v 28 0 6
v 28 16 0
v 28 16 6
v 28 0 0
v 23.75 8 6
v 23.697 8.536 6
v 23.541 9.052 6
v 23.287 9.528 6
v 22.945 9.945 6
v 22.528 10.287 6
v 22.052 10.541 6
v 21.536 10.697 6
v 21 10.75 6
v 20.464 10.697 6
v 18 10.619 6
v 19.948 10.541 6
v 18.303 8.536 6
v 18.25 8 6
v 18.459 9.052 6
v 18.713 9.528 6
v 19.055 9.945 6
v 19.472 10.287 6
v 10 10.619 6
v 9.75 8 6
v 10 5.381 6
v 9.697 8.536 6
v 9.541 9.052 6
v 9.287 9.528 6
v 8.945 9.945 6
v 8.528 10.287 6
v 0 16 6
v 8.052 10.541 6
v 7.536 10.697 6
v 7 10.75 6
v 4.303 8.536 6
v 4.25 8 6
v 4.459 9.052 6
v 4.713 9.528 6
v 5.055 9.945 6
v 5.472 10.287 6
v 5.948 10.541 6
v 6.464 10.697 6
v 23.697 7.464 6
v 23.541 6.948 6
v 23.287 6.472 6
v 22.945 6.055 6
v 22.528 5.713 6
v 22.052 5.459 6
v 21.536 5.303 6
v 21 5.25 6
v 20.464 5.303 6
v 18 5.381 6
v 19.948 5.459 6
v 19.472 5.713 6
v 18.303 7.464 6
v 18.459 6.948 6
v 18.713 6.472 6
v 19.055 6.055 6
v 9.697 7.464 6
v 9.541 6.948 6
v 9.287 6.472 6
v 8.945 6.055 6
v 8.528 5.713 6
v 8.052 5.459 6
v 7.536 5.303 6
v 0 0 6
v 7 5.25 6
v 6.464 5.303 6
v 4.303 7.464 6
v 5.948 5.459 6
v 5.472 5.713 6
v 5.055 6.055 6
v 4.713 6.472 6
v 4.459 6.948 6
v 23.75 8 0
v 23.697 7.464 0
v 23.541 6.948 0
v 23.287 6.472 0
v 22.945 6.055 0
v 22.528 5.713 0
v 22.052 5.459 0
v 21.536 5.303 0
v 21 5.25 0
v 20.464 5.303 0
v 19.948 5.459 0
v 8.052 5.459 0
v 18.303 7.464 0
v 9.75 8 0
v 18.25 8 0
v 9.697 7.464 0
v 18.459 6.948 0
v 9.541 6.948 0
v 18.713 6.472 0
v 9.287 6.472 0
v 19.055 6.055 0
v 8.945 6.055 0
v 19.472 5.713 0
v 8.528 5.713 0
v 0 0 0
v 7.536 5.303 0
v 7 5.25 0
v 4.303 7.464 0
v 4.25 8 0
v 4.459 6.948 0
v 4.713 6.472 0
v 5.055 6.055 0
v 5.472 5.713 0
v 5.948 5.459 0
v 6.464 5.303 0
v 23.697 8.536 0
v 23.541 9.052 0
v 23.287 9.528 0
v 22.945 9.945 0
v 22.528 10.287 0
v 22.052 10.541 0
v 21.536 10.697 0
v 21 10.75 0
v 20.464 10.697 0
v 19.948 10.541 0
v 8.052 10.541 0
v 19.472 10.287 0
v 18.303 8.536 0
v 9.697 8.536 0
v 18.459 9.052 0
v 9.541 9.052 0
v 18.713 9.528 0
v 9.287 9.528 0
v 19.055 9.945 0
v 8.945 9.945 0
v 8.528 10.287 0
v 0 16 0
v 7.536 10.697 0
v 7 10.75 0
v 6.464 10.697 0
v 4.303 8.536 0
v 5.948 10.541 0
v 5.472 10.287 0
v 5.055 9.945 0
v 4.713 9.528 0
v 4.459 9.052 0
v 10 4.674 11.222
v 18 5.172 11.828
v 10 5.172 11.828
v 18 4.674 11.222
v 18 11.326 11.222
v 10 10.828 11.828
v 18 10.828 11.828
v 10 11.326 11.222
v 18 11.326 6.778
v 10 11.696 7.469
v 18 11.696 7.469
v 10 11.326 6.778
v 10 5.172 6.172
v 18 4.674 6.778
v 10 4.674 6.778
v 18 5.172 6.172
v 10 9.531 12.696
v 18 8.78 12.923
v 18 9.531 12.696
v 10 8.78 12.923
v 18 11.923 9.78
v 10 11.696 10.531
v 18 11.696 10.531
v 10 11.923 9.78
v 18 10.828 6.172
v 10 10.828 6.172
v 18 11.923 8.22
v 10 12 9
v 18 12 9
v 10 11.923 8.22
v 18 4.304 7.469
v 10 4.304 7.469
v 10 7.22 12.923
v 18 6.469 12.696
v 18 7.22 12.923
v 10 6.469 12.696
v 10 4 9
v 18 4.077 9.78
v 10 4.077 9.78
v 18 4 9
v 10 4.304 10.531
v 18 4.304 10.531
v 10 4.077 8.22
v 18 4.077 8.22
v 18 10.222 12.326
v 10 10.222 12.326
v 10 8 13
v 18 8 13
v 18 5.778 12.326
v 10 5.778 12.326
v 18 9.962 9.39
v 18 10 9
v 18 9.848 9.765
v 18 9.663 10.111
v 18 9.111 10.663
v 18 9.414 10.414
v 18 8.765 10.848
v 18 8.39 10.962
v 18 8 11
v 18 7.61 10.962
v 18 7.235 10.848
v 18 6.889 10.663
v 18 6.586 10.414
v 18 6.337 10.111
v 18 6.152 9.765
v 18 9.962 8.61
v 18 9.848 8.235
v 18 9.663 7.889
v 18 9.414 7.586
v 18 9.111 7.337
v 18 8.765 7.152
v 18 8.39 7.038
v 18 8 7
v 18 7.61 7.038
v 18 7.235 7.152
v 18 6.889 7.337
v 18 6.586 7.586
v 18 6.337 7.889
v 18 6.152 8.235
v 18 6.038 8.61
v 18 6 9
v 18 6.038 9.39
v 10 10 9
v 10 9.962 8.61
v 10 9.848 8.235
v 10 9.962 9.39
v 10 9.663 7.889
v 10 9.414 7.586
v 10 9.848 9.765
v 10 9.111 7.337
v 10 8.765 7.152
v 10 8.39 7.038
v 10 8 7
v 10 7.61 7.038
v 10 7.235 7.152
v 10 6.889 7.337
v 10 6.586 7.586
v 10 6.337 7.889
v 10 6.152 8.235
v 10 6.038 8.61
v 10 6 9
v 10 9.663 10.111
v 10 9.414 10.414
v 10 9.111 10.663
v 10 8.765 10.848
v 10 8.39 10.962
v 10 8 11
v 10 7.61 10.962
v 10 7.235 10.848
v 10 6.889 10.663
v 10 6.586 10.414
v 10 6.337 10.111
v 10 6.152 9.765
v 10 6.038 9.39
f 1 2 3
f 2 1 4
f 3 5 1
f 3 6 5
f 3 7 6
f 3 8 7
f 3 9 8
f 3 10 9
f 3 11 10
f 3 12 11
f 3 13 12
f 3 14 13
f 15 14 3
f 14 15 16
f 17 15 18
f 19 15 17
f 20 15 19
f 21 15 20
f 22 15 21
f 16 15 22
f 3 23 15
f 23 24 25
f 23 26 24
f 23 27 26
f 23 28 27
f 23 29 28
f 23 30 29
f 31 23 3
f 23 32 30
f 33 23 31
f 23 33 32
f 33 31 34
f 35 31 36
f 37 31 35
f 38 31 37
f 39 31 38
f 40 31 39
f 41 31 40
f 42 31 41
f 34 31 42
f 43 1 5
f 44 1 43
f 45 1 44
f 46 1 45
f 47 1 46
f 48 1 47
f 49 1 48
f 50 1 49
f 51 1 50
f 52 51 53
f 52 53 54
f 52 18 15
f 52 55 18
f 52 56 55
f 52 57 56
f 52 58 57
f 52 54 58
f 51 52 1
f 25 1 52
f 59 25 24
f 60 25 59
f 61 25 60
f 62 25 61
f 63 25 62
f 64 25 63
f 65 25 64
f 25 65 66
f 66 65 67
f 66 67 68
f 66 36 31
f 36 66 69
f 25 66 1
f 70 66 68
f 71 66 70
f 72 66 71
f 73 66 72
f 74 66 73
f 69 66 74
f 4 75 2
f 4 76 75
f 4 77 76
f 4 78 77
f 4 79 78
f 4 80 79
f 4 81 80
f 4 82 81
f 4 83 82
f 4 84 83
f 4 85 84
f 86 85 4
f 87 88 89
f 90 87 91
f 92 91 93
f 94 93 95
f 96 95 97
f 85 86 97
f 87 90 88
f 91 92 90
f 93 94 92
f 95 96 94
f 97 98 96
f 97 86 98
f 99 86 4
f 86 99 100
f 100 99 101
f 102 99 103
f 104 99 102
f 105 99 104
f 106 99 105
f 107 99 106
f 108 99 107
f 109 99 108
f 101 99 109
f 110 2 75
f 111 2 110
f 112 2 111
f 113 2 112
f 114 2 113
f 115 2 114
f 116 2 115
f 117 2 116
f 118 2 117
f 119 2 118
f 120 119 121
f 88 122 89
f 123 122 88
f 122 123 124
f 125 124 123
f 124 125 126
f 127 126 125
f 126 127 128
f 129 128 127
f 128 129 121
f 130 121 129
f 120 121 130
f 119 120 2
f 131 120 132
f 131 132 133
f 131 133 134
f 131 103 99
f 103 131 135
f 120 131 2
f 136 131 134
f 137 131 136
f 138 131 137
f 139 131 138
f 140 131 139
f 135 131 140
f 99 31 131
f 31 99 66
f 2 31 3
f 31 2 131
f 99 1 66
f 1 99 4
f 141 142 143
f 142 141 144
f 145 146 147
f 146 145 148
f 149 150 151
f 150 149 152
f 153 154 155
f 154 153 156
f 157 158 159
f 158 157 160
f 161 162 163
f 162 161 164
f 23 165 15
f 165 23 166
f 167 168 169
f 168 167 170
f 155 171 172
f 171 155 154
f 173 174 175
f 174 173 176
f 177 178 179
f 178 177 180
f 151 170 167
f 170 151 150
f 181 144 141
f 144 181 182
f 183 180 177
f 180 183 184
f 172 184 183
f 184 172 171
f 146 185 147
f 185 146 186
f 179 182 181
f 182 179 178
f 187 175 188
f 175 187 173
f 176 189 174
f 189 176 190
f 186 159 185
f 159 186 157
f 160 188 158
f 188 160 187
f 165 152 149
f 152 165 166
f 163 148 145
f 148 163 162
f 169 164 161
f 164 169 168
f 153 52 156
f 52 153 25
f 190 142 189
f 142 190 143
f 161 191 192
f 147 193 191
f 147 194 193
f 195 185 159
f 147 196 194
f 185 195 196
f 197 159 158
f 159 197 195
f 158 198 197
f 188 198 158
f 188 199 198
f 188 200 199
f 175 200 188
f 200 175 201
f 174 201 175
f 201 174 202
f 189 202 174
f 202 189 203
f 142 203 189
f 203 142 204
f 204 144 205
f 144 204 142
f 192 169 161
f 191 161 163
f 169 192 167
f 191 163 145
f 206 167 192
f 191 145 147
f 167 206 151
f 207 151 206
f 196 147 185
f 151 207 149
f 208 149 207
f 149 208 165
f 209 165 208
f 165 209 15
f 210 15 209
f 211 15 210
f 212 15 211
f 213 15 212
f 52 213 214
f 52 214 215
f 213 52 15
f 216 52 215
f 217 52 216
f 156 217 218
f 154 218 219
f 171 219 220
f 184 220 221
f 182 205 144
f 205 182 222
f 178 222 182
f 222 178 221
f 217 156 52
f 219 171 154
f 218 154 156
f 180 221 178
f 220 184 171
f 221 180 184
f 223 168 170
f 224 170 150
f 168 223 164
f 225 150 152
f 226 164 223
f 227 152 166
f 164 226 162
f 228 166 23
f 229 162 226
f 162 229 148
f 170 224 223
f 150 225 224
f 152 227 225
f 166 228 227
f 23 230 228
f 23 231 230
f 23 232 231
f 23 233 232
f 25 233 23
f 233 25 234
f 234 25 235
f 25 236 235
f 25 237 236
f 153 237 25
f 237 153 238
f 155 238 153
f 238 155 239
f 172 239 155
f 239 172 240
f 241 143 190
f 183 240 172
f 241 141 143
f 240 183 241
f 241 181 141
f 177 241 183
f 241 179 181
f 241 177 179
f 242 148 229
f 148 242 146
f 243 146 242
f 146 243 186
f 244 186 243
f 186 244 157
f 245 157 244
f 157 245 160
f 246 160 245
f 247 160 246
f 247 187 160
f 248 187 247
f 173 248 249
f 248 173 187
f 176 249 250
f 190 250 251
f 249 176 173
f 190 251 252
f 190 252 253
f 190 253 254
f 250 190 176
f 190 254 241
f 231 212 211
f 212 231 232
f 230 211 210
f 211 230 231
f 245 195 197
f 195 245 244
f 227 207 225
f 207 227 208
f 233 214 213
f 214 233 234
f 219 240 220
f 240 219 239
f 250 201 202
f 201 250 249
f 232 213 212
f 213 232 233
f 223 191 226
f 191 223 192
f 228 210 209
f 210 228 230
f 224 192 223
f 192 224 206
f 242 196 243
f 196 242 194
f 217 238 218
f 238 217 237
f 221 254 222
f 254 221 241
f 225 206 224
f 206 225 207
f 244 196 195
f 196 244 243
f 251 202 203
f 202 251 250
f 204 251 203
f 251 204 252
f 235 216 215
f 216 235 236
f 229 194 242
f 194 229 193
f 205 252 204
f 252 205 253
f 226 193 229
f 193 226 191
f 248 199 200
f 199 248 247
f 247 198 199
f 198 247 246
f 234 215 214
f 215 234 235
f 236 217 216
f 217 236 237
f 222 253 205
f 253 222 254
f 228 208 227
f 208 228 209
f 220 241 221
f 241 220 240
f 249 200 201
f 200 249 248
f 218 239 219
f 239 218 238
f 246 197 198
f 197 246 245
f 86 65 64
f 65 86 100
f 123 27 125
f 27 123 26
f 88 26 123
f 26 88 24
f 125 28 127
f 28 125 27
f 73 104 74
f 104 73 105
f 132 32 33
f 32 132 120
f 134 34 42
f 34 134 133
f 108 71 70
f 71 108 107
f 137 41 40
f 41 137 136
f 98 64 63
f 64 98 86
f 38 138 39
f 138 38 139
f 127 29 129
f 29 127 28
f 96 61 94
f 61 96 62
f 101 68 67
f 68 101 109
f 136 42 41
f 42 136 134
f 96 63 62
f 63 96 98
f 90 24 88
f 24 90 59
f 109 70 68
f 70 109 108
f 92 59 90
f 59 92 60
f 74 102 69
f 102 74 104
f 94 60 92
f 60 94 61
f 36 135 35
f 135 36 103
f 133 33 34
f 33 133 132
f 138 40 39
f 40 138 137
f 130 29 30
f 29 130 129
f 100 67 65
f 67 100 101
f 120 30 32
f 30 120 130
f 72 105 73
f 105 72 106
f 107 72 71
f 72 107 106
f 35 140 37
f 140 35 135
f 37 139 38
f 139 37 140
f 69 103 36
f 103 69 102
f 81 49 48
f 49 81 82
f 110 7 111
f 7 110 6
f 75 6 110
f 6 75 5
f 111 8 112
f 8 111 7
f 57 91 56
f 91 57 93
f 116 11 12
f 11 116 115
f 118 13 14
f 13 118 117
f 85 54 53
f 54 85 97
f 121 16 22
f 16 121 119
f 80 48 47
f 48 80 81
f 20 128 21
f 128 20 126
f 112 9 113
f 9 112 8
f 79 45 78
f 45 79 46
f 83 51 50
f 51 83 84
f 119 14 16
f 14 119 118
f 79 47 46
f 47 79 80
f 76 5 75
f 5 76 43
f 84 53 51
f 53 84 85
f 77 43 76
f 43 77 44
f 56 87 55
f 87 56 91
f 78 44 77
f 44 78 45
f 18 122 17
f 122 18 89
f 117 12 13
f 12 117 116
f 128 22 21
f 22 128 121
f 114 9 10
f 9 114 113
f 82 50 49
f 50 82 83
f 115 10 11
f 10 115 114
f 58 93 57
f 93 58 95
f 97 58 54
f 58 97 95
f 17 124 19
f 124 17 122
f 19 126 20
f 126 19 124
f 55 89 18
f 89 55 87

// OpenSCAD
$fn = 32;

// ----------------------------------------------------------------------
// Cable clip: cable 4 mm, clamp 8 mm, base 28 mm
// ----------------------------------------------------------------------

// --- parameters (mm) ---
foot_w = 28;              // base length, X
foot_d = 16;              // base width, Y
foot_t = 6;               // base thickness
hose_seat_d = 8;          // clamp outside diameter
ring_t = 2;               // clamp wall
cable_d = 4;              // cable opening
ring_w = 8;               // clamp width along the cable
screw_d = 5.5;            // screw clearance
sink = 1;                 // overlap of the clamp into the base

module base() {
  cube([foot_w, foot_d, foot_t]);
}

module clamp() {
  translate([foot_w / 2, foot_d / 2, foot_t + hose_seat_d / 2 - sink]) rotate([0, 90, 0])
    cylinder(h = ring_w, d = hose_seat_d, center = true);
}

difference() {
  union() {
    base();
    clamp();
  }
  translate([foot_w / 2, foot_d / 2, foot_t + hose_seat_d / 2 - sink]) rotate([0, 90, 0]) translate([0, 0, -ring_w / 2 - 1]) cylinder(h = ring_w + 2, d = cable_d);
  translate([7, foot_d / 2, -1]) cylinder(h = foot_t + 2, d = screw_d);
  translate([21, foot_d / 2, -1]) cylinder(h = foot_t + 2, d = screw_d);
}
